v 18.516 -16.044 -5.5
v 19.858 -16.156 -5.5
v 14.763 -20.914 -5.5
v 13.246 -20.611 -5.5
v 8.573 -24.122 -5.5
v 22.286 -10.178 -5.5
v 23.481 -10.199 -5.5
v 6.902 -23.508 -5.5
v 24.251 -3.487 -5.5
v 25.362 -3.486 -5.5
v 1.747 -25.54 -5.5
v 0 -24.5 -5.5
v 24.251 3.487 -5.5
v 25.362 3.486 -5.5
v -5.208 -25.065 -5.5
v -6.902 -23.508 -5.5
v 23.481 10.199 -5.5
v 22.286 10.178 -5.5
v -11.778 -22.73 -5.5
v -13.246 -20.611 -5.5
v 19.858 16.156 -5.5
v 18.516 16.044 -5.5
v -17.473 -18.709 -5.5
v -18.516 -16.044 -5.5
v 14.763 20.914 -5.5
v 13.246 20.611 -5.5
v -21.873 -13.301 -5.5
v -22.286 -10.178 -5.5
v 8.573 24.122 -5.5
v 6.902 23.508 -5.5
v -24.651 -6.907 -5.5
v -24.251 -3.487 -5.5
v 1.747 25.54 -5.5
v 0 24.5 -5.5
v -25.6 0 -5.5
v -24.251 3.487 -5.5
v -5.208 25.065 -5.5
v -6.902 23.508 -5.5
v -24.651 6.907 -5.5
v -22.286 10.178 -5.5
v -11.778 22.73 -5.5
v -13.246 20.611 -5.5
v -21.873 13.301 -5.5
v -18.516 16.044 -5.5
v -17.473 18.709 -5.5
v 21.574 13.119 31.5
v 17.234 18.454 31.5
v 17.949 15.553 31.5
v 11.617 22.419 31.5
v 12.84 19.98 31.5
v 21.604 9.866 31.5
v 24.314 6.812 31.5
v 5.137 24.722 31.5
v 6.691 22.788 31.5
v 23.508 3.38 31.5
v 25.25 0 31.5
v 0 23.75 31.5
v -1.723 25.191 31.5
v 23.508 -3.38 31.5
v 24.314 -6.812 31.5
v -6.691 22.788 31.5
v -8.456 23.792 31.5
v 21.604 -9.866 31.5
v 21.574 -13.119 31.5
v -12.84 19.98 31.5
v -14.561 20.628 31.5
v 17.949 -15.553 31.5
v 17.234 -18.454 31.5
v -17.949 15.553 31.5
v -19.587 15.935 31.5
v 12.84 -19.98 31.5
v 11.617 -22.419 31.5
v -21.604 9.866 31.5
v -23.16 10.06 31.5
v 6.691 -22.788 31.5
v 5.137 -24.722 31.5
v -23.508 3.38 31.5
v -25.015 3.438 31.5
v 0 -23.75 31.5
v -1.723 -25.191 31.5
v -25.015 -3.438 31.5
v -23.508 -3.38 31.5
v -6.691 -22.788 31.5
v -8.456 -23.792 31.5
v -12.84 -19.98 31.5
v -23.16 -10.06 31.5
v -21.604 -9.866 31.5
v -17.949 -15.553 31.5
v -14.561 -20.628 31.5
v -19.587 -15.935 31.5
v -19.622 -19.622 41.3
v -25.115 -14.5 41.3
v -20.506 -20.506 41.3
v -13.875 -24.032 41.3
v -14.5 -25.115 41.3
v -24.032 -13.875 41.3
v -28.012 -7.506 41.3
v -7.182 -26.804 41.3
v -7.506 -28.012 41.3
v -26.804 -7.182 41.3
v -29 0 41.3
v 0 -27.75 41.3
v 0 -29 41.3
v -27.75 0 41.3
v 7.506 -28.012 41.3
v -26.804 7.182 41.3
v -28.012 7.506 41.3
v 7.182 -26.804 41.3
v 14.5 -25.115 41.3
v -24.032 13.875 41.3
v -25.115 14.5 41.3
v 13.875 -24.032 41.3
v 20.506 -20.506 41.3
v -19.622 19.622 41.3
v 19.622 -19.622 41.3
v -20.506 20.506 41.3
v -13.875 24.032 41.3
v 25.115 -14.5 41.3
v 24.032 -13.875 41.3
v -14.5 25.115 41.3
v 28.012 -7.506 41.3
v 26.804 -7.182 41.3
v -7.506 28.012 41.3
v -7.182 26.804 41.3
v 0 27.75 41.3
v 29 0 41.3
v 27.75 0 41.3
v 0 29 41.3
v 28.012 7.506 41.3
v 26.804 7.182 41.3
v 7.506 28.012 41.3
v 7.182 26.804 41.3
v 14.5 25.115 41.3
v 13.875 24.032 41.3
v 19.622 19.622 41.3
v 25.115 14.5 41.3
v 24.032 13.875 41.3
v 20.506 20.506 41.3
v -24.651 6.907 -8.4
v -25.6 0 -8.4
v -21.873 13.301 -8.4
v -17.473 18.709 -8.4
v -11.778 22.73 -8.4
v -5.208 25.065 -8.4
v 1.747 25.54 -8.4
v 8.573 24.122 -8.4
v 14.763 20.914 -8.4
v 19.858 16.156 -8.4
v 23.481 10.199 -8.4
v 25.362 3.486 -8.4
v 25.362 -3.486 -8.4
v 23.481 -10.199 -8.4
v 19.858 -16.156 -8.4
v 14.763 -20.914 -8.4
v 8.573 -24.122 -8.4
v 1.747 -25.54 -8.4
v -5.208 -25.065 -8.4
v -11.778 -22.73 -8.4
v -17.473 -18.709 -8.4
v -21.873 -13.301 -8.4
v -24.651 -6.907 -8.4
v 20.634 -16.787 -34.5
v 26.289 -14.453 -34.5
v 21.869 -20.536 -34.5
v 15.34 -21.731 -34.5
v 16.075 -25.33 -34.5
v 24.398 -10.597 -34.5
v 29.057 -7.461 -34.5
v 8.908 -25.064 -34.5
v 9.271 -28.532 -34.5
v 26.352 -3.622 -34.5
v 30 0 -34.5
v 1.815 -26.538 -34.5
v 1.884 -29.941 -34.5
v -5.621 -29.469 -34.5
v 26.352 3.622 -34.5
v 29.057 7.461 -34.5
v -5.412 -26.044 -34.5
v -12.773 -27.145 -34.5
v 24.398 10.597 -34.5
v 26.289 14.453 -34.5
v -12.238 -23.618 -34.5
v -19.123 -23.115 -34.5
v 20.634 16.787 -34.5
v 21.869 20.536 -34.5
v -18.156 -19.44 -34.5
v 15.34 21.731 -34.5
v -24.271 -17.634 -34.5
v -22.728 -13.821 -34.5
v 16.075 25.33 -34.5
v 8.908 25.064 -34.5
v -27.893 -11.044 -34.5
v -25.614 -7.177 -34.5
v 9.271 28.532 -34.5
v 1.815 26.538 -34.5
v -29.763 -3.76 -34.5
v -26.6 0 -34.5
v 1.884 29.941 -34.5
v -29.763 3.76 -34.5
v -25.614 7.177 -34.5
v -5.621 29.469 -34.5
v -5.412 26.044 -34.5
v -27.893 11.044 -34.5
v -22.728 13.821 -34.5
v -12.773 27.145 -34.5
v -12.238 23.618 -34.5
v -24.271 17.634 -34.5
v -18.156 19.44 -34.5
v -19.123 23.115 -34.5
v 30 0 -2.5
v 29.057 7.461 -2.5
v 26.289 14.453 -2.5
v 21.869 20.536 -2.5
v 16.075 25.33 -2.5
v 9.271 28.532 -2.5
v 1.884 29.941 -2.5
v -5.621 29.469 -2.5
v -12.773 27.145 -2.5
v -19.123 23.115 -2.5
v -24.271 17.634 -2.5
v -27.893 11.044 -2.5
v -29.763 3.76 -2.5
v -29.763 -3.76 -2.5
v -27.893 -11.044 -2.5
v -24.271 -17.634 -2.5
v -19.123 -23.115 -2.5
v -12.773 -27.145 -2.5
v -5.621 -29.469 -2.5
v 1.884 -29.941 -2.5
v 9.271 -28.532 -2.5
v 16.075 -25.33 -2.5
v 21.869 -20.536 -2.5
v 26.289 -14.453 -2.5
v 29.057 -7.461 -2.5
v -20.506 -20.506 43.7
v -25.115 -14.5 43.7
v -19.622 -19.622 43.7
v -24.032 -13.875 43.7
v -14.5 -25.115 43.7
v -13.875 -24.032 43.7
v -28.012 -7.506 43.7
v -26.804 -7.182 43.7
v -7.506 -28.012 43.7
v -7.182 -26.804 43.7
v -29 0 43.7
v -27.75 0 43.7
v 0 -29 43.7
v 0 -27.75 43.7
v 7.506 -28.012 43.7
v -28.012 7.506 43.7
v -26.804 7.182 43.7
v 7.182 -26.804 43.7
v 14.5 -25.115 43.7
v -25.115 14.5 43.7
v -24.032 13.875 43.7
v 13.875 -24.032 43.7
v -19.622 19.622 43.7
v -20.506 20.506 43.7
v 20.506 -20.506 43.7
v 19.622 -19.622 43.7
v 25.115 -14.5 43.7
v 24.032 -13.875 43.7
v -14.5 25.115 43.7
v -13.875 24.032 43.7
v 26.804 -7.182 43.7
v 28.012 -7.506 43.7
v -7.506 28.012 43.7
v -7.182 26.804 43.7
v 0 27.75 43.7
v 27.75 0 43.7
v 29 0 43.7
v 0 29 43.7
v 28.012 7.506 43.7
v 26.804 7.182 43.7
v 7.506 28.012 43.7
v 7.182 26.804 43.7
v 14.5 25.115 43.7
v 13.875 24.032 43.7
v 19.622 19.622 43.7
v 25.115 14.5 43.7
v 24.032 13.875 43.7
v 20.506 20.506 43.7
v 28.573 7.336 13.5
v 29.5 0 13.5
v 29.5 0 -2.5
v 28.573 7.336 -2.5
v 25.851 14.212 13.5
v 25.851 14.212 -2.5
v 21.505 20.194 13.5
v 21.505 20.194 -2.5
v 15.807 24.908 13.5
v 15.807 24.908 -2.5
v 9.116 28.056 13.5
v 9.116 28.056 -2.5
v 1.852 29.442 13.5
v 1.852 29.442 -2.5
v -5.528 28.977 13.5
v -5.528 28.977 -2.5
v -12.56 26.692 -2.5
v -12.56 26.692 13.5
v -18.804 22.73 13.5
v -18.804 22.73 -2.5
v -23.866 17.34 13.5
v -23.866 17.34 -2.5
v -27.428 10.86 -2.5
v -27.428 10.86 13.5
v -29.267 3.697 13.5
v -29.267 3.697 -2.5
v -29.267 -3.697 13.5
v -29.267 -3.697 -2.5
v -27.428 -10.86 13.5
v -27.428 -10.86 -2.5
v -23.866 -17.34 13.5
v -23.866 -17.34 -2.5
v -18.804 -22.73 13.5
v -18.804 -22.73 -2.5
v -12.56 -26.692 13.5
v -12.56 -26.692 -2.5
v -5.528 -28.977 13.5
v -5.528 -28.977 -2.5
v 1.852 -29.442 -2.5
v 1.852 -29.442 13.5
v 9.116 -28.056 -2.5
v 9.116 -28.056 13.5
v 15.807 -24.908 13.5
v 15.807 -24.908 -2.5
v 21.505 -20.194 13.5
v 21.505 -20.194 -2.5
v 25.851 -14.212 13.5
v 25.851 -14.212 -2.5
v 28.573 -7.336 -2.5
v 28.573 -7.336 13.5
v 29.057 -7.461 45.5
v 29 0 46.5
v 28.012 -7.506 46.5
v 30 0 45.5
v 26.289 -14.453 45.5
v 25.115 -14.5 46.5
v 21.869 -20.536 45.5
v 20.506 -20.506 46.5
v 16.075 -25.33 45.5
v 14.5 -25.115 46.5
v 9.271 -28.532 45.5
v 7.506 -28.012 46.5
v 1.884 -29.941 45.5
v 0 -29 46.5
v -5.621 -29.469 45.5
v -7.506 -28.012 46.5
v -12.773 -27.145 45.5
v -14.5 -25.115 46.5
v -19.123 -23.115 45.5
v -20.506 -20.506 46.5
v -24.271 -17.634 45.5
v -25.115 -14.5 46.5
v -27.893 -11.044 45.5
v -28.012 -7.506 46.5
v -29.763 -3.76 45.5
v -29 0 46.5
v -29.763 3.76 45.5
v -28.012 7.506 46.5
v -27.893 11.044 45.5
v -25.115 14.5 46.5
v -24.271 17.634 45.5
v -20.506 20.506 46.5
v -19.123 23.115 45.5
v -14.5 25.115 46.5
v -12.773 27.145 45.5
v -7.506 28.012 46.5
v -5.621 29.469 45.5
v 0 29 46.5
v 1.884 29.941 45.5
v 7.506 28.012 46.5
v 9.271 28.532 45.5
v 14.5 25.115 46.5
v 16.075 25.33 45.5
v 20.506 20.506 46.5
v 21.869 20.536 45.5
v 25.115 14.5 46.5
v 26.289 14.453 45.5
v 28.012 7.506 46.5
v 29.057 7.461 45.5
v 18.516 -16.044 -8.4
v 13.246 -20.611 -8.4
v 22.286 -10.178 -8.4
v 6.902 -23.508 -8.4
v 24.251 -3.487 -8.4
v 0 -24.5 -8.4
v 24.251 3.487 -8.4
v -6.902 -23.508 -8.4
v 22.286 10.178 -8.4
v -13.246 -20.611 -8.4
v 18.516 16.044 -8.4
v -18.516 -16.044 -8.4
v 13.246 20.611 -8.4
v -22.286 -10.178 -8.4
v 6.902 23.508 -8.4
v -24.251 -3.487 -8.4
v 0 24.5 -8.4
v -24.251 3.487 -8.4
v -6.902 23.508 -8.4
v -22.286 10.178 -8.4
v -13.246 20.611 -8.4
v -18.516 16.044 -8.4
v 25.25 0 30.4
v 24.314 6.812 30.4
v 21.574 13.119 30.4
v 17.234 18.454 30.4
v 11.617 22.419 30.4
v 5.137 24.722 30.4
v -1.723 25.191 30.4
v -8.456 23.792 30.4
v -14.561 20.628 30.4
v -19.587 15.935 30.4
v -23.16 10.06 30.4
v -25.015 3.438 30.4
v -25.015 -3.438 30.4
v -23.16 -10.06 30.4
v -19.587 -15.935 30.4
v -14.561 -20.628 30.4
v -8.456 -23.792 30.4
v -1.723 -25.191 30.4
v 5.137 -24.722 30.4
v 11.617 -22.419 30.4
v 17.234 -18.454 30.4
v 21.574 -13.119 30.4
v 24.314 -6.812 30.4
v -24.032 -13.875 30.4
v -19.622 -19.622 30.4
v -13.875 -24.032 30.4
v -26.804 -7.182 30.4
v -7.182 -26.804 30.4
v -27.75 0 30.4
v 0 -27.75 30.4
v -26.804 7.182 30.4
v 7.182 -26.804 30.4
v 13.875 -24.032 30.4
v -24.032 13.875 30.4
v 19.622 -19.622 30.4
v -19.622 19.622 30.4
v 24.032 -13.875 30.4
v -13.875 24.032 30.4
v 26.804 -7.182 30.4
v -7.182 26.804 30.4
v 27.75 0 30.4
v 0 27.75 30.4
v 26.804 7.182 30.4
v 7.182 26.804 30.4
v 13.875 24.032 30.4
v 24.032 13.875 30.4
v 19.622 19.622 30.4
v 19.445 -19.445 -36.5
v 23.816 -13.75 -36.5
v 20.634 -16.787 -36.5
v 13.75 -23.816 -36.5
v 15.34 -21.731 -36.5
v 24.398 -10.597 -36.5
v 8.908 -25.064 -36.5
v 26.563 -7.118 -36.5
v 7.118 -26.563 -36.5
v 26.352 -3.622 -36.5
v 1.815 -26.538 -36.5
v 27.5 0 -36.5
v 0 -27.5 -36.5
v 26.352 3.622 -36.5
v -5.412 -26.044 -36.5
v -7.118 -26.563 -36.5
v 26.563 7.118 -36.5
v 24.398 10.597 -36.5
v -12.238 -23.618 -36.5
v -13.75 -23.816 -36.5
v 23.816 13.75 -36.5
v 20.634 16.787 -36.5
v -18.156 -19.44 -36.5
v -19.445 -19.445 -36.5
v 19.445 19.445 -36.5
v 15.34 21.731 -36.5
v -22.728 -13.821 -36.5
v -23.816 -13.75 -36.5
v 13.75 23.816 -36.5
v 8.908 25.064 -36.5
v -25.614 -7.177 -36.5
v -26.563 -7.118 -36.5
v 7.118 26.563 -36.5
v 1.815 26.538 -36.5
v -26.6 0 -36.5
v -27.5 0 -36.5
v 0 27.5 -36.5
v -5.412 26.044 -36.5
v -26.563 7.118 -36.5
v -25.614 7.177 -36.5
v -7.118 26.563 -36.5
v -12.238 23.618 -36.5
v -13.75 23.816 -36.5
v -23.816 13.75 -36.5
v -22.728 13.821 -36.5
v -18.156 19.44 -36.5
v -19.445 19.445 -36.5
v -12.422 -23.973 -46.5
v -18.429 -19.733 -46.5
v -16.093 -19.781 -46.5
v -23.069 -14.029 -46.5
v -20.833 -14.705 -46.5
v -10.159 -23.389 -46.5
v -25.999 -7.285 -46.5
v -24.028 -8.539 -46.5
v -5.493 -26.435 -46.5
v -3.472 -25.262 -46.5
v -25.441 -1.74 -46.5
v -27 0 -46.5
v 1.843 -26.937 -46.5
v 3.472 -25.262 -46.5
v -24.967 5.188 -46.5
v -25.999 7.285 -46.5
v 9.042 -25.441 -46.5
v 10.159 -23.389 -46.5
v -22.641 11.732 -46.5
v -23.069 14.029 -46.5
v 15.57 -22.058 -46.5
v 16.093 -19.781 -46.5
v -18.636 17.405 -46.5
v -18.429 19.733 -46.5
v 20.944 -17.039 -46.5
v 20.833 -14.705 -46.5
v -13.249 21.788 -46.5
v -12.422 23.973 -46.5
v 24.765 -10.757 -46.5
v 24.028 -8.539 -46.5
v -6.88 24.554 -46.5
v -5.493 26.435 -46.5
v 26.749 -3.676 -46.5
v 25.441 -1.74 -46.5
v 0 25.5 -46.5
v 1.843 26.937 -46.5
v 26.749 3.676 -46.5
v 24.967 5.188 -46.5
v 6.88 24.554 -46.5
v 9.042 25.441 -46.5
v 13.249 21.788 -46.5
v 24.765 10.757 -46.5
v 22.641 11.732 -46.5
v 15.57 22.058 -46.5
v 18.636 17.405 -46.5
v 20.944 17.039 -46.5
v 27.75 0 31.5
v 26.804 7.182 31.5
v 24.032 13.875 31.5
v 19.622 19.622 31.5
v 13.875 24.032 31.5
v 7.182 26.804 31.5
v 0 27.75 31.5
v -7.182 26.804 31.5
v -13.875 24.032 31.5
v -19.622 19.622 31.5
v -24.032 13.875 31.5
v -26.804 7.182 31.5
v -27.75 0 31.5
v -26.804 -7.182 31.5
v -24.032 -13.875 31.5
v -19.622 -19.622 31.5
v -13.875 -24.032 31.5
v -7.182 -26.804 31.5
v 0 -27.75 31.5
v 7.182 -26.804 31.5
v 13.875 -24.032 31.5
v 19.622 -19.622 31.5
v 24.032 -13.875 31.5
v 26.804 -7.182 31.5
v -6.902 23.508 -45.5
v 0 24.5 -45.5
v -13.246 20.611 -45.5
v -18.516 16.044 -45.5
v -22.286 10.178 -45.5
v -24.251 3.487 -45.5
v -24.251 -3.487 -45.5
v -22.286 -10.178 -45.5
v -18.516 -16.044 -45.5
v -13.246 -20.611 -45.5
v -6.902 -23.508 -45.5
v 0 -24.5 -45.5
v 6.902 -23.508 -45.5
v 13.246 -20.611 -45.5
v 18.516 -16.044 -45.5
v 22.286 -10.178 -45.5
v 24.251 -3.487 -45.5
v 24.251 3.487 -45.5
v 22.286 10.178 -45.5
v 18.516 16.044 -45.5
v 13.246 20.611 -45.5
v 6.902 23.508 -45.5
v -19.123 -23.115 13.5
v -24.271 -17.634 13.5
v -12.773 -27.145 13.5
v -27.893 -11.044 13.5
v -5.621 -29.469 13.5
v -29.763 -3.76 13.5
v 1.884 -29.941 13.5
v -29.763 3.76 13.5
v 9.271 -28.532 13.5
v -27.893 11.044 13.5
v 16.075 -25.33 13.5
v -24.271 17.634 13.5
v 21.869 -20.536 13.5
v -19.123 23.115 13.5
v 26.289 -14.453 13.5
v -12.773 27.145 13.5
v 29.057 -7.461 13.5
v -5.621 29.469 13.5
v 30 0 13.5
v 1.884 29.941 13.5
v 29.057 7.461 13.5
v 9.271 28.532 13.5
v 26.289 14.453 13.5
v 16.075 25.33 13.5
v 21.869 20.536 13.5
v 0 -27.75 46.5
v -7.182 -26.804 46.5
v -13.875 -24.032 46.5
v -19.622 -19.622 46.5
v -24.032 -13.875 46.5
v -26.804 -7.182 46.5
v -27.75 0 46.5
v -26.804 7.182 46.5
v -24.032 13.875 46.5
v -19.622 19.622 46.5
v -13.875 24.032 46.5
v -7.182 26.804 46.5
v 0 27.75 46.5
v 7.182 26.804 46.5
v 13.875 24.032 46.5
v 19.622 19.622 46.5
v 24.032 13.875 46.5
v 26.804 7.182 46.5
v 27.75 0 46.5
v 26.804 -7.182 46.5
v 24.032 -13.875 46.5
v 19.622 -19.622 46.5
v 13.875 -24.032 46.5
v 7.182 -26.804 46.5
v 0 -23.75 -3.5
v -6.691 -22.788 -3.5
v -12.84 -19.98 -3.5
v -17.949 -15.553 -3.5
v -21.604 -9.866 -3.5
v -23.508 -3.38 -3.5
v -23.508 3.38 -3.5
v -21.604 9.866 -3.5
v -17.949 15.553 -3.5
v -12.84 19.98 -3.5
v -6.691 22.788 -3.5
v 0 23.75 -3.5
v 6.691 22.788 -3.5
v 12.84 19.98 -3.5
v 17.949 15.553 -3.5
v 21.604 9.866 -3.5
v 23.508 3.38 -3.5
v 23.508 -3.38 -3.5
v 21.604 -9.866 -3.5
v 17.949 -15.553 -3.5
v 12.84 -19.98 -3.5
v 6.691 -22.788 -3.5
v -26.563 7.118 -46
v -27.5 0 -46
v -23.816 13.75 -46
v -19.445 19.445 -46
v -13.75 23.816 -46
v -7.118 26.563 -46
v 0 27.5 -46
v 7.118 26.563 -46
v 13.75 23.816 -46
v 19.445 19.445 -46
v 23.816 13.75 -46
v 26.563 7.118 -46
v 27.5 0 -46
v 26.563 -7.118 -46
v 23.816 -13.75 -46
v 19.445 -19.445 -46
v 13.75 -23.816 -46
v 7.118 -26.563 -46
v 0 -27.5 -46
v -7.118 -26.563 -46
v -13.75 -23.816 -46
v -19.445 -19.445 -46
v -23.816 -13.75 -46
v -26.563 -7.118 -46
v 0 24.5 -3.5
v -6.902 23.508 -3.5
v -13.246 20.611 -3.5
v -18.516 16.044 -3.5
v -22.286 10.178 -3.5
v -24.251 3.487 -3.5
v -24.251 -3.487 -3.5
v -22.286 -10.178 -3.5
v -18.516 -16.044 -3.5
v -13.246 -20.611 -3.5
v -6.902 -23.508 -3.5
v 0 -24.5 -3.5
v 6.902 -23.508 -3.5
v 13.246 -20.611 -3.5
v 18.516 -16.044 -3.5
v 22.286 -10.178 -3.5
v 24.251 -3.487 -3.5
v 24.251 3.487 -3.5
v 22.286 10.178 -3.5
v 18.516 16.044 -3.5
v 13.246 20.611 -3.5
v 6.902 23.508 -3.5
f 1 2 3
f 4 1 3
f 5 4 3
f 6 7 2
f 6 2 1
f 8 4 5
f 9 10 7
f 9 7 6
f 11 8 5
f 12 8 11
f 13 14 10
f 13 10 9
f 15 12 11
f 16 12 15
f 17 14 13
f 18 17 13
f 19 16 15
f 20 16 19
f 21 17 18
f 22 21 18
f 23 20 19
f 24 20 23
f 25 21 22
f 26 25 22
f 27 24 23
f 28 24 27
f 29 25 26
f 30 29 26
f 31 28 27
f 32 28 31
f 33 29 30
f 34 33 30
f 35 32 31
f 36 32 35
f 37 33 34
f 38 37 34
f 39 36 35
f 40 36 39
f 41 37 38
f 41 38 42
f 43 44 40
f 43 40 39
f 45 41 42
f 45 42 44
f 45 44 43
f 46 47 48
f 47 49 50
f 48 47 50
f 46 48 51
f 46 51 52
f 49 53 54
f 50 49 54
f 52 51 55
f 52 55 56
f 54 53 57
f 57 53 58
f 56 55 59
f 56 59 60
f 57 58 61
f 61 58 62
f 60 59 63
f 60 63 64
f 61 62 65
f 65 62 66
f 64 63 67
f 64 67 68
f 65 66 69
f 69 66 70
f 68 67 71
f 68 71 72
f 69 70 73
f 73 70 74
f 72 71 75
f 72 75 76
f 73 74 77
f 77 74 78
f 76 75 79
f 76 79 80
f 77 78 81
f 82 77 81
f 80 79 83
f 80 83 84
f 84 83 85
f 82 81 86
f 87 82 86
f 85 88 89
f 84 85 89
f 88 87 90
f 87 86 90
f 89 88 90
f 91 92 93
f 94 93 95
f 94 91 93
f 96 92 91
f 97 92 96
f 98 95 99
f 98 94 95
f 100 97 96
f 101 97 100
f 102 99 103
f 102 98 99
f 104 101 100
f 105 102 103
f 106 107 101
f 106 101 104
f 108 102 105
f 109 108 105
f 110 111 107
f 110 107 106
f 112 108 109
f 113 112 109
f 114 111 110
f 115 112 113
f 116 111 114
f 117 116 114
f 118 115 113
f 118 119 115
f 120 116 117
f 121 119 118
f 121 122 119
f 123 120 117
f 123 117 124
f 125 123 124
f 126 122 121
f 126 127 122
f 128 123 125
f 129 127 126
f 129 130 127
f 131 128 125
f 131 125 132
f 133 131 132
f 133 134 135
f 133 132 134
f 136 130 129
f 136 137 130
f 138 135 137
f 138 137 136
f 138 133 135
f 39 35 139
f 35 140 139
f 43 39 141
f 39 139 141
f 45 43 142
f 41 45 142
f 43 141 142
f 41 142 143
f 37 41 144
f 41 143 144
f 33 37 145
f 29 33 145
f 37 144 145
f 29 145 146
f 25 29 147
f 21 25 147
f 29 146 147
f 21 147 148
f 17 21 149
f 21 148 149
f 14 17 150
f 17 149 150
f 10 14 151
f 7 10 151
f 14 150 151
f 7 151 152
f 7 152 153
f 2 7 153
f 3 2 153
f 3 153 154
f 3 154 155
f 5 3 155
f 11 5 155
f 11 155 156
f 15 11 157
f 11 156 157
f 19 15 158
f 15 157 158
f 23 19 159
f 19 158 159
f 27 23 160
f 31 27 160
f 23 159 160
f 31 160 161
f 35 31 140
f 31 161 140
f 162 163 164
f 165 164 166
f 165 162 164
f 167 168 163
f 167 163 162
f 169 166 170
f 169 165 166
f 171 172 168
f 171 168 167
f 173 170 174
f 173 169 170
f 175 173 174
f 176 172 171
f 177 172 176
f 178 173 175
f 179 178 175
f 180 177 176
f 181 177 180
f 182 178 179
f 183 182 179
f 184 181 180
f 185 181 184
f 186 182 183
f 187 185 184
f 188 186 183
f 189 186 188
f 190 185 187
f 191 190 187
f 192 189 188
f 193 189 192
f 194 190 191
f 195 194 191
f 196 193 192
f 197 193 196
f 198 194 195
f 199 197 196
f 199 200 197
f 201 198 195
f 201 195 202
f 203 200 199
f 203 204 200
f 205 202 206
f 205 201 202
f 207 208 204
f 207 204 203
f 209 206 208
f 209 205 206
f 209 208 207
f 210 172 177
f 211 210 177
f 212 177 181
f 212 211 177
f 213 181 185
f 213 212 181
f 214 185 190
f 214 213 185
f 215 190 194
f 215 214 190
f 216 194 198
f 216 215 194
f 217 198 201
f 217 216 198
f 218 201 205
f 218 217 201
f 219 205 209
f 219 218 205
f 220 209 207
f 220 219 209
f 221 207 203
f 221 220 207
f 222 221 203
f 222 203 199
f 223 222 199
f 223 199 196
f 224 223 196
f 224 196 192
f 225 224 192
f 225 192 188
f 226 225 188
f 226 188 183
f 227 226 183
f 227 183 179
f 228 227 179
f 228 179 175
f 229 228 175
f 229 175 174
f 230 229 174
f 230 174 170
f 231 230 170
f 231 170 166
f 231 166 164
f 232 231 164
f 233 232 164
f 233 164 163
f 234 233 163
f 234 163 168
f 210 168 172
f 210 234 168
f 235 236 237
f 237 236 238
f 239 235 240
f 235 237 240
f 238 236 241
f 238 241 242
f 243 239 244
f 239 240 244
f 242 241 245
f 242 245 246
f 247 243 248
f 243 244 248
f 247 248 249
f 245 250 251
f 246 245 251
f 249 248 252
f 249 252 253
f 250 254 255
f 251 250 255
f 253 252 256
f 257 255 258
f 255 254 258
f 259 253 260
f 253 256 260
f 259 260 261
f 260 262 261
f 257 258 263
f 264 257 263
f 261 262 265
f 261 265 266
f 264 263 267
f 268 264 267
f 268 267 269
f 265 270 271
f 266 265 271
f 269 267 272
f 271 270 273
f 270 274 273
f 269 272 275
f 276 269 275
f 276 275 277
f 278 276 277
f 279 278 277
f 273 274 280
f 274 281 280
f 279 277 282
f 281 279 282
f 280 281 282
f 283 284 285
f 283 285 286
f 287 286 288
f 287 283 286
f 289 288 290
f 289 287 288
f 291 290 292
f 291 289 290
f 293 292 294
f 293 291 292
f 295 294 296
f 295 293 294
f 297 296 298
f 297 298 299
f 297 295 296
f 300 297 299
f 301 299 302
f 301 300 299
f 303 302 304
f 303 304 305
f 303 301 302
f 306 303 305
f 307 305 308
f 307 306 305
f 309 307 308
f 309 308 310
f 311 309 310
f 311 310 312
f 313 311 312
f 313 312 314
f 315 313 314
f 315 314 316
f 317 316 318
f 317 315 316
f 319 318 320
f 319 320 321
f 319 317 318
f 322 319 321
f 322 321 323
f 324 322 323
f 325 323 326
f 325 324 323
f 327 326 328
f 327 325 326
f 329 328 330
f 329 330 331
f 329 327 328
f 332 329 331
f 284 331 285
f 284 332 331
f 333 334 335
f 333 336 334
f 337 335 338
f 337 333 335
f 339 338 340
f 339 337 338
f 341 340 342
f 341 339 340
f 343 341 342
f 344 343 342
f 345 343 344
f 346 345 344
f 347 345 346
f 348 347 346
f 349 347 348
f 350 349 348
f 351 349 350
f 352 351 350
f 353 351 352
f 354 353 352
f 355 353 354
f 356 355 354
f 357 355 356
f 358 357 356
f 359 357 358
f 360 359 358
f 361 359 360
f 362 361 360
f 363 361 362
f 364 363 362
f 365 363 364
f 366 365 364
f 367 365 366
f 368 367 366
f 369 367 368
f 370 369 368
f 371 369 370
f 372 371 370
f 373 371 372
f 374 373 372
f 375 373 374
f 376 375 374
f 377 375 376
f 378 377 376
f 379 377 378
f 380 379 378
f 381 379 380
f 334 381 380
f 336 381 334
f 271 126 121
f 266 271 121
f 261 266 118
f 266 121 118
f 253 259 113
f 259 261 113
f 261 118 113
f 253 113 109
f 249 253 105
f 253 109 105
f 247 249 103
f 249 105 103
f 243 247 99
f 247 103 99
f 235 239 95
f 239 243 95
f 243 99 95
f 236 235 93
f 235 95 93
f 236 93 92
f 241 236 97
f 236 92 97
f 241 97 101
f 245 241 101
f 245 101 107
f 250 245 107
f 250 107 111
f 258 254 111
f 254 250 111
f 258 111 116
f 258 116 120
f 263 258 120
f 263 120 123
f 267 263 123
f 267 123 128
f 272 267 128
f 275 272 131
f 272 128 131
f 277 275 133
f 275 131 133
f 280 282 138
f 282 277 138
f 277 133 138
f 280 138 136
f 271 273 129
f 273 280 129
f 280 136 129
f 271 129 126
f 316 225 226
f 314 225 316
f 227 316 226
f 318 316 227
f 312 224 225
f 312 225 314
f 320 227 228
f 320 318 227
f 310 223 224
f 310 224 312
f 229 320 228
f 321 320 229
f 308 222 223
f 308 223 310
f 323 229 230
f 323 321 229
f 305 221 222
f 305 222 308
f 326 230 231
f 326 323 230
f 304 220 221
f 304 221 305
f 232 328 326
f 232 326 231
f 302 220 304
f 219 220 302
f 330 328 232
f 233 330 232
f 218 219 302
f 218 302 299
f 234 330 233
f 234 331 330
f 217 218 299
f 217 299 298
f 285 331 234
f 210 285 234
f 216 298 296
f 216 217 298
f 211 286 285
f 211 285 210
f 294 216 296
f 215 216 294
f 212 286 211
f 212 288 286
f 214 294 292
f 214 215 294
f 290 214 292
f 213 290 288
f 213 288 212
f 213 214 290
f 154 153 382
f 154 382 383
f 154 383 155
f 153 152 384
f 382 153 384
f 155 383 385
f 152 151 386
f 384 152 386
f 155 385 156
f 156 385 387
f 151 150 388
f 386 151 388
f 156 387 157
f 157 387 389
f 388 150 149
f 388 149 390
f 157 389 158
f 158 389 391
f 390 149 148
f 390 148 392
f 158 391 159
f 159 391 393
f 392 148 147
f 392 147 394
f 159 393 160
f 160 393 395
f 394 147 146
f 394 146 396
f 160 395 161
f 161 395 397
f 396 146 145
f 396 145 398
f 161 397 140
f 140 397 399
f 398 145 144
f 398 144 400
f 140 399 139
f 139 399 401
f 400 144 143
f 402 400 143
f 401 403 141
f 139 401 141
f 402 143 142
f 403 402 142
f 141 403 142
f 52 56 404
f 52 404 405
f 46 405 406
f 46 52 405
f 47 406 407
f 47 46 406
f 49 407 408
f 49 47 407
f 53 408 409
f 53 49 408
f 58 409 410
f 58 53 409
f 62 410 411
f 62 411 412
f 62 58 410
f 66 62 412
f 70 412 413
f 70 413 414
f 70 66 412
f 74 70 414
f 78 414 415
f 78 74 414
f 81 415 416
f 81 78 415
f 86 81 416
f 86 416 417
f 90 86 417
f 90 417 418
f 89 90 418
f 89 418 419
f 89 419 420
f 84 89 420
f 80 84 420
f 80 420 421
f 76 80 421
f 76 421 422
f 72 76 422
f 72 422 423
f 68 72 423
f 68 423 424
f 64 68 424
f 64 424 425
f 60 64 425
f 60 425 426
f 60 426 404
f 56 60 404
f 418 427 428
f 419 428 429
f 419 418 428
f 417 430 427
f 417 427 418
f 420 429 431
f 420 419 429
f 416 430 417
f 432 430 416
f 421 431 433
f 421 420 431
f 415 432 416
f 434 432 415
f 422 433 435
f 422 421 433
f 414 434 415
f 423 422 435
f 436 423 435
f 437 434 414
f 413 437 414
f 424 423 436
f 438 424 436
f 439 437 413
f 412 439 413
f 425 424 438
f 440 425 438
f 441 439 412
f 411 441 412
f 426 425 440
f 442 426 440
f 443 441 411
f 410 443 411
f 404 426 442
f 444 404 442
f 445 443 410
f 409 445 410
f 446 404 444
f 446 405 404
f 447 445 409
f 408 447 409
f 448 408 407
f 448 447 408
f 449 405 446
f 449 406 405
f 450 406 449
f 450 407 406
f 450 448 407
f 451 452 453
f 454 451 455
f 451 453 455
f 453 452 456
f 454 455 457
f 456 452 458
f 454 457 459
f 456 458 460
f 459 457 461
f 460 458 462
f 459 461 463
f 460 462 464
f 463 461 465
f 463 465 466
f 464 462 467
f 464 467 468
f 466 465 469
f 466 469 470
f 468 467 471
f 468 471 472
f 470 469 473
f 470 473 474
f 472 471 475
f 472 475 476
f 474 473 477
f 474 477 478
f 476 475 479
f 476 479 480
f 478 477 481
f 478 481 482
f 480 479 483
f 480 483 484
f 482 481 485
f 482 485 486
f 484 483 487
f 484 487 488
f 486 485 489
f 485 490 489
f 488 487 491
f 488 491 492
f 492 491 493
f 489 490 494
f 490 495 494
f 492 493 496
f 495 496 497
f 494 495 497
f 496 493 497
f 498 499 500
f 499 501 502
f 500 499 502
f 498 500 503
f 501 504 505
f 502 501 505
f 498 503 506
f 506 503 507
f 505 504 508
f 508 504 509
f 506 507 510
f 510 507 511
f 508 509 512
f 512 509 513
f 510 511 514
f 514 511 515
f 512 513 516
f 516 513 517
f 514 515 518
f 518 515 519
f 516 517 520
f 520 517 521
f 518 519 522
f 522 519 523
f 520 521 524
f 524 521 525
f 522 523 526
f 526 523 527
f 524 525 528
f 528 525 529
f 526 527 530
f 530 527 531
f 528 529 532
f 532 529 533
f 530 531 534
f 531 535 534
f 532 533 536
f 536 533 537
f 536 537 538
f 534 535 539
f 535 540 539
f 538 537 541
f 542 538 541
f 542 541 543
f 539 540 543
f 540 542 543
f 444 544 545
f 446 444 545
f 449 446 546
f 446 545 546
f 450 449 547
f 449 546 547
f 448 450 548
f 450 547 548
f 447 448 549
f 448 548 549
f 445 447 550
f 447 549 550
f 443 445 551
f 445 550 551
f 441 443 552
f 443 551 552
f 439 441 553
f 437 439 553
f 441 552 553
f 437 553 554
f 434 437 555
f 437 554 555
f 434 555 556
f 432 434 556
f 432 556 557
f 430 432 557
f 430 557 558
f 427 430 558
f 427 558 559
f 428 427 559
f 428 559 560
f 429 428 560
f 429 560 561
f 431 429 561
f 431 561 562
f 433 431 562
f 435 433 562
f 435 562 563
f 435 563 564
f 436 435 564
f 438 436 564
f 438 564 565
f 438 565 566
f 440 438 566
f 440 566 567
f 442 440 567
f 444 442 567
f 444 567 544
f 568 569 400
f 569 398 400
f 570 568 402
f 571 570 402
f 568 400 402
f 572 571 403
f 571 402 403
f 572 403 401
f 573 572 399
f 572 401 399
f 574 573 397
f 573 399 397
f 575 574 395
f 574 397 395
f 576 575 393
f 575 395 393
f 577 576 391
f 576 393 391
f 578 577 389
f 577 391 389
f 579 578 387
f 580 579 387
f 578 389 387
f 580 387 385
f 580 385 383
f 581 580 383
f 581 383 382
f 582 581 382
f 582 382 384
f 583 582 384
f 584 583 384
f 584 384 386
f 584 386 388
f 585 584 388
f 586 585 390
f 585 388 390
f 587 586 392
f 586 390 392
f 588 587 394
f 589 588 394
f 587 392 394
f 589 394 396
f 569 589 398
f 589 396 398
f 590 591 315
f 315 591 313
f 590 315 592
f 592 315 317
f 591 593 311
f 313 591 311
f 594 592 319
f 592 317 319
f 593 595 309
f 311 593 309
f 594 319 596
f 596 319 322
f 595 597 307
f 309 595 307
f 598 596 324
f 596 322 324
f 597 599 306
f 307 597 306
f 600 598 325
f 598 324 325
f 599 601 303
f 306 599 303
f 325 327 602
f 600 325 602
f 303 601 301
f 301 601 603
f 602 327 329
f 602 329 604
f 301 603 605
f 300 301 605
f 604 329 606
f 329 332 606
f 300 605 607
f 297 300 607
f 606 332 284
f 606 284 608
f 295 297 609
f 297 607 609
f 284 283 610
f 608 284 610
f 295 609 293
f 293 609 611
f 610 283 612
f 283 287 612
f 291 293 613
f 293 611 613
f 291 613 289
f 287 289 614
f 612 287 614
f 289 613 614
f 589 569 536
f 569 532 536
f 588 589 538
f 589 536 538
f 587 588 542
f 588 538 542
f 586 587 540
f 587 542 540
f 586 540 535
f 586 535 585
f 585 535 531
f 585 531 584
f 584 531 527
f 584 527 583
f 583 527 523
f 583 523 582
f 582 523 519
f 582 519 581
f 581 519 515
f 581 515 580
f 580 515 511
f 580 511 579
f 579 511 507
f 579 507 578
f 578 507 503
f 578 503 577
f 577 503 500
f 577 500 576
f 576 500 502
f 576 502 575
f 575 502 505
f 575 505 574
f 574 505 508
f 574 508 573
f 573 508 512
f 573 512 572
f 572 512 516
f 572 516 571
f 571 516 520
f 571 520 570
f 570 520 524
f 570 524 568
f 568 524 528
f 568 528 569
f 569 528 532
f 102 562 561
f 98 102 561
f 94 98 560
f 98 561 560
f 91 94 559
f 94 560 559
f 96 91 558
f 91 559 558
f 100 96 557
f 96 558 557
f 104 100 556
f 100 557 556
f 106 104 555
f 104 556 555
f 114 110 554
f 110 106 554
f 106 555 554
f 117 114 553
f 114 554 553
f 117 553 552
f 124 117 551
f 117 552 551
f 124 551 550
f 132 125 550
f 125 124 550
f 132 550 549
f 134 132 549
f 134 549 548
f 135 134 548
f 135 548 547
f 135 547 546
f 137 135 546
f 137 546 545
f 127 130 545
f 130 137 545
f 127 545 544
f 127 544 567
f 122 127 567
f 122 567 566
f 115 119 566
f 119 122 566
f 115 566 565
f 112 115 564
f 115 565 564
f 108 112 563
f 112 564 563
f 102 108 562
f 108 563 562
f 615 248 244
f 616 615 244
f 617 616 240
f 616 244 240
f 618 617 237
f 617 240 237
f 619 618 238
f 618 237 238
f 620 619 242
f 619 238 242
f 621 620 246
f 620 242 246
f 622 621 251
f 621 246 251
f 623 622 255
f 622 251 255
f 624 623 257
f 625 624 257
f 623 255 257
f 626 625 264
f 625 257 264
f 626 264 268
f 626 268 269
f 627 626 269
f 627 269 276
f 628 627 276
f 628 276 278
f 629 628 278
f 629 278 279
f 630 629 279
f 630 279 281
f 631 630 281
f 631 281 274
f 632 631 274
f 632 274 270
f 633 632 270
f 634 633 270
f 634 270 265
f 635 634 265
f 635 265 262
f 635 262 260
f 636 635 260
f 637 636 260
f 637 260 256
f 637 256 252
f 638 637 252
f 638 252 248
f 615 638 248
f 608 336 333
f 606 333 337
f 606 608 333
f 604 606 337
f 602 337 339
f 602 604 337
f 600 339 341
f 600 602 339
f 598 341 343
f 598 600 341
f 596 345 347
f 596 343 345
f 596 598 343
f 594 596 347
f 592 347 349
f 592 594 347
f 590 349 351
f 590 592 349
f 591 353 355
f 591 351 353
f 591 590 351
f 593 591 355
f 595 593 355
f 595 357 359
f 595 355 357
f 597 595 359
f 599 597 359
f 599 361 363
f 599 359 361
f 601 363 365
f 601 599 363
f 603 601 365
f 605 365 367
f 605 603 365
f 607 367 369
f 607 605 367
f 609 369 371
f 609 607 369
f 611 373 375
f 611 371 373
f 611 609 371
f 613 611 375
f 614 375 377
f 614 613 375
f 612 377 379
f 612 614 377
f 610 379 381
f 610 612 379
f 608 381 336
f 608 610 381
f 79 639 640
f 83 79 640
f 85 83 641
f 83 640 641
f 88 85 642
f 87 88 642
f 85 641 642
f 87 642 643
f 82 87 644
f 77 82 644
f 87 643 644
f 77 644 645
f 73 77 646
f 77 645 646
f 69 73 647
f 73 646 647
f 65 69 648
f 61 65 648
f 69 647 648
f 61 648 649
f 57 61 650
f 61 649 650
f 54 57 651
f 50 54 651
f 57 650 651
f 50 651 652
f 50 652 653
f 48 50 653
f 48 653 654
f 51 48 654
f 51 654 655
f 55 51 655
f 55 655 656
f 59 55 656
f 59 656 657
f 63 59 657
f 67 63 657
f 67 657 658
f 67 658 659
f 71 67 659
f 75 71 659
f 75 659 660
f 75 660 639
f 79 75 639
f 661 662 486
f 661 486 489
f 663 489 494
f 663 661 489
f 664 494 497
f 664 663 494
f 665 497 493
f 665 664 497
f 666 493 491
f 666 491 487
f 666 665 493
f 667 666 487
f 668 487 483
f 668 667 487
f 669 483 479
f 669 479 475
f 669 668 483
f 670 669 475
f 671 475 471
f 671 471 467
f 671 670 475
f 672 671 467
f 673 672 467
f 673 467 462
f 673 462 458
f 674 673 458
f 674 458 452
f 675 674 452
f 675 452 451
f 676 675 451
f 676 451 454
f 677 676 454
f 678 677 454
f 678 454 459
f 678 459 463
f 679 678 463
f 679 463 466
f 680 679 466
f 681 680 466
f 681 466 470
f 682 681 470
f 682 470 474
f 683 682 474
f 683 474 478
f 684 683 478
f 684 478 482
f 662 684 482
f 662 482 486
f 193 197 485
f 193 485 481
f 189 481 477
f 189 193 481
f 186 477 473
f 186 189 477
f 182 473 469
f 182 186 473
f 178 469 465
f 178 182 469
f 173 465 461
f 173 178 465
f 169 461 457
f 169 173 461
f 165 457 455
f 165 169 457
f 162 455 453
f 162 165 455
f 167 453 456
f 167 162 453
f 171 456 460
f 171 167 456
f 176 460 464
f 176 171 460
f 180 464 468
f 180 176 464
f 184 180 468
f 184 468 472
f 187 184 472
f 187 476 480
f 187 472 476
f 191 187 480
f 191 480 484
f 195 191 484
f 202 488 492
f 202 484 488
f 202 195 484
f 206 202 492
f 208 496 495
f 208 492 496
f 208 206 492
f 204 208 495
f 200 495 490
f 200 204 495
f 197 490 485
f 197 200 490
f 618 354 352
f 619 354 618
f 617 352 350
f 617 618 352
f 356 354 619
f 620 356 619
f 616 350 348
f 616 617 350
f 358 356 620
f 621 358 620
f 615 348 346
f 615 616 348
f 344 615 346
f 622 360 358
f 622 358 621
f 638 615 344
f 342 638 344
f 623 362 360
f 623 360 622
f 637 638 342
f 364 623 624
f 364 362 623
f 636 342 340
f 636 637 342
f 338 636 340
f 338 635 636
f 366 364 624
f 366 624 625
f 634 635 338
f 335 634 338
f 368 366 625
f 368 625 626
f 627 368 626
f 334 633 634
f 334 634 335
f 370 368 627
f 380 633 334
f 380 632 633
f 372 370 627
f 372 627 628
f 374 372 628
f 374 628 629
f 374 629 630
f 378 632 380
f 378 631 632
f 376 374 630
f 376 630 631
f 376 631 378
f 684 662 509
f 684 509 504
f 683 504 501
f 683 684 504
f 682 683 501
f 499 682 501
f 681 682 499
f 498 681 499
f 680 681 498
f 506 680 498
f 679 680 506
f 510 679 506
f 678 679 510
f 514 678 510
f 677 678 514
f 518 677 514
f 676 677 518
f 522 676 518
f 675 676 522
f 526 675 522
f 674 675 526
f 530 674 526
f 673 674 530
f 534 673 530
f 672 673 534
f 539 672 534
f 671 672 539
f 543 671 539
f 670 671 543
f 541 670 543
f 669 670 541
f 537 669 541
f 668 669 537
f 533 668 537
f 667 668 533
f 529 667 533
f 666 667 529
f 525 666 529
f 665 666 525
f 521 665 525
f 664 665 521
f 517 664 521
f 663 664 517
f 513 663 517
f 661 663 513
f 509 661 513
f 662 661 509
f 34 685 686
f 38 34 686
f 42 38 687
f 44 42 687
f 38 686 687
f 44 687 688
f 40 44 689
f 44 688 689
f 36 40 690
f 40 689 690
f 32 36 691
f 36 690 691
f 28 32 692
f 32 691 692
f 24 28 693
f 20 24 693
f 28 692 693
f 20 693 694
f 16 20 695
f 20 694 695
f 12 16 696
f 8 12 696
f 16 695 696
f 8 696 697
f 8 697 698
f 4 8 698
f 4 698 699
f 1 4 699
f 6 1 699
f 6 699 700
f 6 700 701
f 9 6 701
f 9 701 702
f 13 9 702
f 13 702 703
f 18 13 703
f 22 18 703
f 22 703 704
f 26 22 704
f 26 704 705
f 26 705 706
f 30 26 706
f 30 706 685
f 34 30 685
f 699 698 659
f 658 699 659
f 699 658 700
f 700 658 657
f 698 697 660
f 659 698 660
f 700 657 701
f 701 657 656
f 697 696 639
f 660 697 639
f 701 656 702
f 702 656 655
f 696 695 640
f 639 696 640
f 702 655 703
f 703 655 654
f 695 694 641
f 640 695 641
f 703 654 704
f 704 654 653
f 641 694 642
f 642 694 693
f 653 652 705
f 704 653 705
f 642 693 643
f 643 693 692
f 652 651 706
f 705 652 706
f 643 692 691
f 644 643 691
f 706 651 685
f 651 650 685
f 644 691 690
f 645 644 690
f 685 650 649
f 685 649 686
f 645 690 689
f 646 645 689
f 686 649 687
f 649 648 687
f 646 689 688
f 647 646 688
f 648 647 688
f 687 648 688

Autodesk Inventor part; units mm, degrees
sketch "Skizze1" plane through (0, 0, 0) normal (0, 0, 1) x (1, 0, 0)
  circle A0 centre (0, 0) radius 30
  dimension "d0" = 60
extrude "Extrusion1" add sketch "Skizze1" along normal mid plane 93
ref_plane "Arbeitsebene1" through (0, 0, 13.5) normal (0, 0, 1) x (1, 0, 0)
ref_plane "Arbeitsebene2" through (0, 0, -2.5) normal (0, 0, 1) x (1, 0, 0)
ref_plane "Arbeitsebene11" through (0, 0, 45) normal (0, 0, 1) x (1, 0, 0)
sketch "Skizze12" plane through (0, 0, 13.5) normal (0, 0, 1) x (1, 0, 0)
  circle A0 centre (0, 0) radius 29.5
  circle A1 centre (0, 0) radius 30 projected
  dimension "d91" = 0.5
extrude "Extrusion9" cut sketch "Skizze12" against normal up to surface (16 mm away)
sketch "Skizze3" plane through (0, 0, 46.5) normal (0, 0, 1) x (1, 0, 0)
  point P0 (0, 0)
  point P1 (0, 0)
hole "Bohrung1" at (0, 0, 46.5) direction (0, 0, -1) diameter 55.5 depth 15
ref_plane "Arbeitsebene13" through (0, 0, 33) normal (0, 0, 1) x (1, 0, 0)
sketch "Skizze4" plane through (0, 0, 31.5) normal (0, 0, 1) x (1, 0, 0)
  point P0 (0, 0)
  point P1 (0, 0)
hole "Bohrung2" at (0, 0, 31.5) direction (0, 0, -1) diameter 47.5 end through all
sketch "Skizze5" plane through (0, 0, -46.5) normal (0, 0, -1) x (-1, 0, 0)
  point P0 (0, 0)
  point P1 (0, 0)
hole "Bohrung3" at (0, 0, -46.5) direction (0, 0, 1) diameter 49 depth 43
sketch "Skizze6" plane through (0, 0, -46.5) normal (0, 0, -1) x (-1, 0, 0)
  circle A0 centre (0, 0) radius 27.5
  circle A1 centre (0, 0) radius 30 projected
  dimension "d35" = 55
extrude "Extrusion3" cut sketch "Skizze6" against normal blind 12
ref_plane "Arbeitsebene4" through (0, 0, -36.5) normal (0, 0, -1) x (-1, 0, 0)
sketch "Skizze7" plane through (0, 0, -46.5) normal (0, 0, -1) x (-1, 0, 0)
  circle A0 centre (0, 0) radius 26.6
  circle A1 centre (0, 0) radius 27.5 projected
  dimension "d39" = 53.2
ref_plane "Arbeitsebene5" through (0, 0, -34.5) normal (0, 0, -1) x (-1, 0, 0)
extrude "Extrusion4" cut sketch "Skizze7" along normal up to surface (2 mm away) from surface at -12
thread "Gewinde1" size "M55x1.5" class "6g" standard "ISO Metric profile" full length
chamfer "Fase3" distance 0.5 angle 45 1 edges at (27.5, 0, -46.5)
ref_plane "Arbeitsebene10" through (0, 0, -8.4) normal (0, 0, -1) x (-1, 0, 0)
ref_plane "Arbeitsebene9" through (0, 0, -5.5) normal (0, 0, -1) x (-1, 0, 0)
sketch "Skizze9" plane through (0, 0, -8.4) normal (0, 0, -1) x (-1, 0, 0)
  circle A0 centre (0, 0) radius 25.6
  dimension "d67" = 51.2
extrude "Extrusion6" cut sketch "Skizze9" against normal up to surface (2.9 mm away) from surface at 0
chamfer "Fase8" distance 1 angle 45 1 edges at (0, -24.5, -46.5)
ref_plane "Arbeitsebene12" through (0, 0, 33) normal (0, 0, 1) x (1, 0, 0)
sketch "Skizze10" plane through (0, 0, 31.5) normal (0, 0, 1) x (1, 0, 0)
  circle A0 centre (0, 0) radius 23.75 projected
  circle A1 centre (0, 0) radius 25.25
  circle A2 centre (0, 0) radius 27.75
  circle A3 centre (0, 0) radius 27.75 projected
  dimension "d76" = 1.5
  dimension "d77" = 2.5
extrude "Extrusion7" cut sketch "Skizze10" against normal blind 1.1 contours A2
ref_plane "Arbeitsebene14" through (0, 0, 41.3) normal (0, 0, 1) x (1, 0, 0)
sketch "Skizze11" plane through (0, 0, 41.3) normal (0, 0, 1) x (1, 0, 0)
  circle A0 centre (0, 0) radius 27.75 projected
  circle A1 centre (0, 0) radius 29
  dimension "d82" = 1.25
extrude "Extrusion8" cut sketch "Skizze11" along normal blind 2.4
chamfer "Fase10" distance 1 angle 45 1 edges at (-30, 0, 46.5)
properties part number "Lampengehäuse"
